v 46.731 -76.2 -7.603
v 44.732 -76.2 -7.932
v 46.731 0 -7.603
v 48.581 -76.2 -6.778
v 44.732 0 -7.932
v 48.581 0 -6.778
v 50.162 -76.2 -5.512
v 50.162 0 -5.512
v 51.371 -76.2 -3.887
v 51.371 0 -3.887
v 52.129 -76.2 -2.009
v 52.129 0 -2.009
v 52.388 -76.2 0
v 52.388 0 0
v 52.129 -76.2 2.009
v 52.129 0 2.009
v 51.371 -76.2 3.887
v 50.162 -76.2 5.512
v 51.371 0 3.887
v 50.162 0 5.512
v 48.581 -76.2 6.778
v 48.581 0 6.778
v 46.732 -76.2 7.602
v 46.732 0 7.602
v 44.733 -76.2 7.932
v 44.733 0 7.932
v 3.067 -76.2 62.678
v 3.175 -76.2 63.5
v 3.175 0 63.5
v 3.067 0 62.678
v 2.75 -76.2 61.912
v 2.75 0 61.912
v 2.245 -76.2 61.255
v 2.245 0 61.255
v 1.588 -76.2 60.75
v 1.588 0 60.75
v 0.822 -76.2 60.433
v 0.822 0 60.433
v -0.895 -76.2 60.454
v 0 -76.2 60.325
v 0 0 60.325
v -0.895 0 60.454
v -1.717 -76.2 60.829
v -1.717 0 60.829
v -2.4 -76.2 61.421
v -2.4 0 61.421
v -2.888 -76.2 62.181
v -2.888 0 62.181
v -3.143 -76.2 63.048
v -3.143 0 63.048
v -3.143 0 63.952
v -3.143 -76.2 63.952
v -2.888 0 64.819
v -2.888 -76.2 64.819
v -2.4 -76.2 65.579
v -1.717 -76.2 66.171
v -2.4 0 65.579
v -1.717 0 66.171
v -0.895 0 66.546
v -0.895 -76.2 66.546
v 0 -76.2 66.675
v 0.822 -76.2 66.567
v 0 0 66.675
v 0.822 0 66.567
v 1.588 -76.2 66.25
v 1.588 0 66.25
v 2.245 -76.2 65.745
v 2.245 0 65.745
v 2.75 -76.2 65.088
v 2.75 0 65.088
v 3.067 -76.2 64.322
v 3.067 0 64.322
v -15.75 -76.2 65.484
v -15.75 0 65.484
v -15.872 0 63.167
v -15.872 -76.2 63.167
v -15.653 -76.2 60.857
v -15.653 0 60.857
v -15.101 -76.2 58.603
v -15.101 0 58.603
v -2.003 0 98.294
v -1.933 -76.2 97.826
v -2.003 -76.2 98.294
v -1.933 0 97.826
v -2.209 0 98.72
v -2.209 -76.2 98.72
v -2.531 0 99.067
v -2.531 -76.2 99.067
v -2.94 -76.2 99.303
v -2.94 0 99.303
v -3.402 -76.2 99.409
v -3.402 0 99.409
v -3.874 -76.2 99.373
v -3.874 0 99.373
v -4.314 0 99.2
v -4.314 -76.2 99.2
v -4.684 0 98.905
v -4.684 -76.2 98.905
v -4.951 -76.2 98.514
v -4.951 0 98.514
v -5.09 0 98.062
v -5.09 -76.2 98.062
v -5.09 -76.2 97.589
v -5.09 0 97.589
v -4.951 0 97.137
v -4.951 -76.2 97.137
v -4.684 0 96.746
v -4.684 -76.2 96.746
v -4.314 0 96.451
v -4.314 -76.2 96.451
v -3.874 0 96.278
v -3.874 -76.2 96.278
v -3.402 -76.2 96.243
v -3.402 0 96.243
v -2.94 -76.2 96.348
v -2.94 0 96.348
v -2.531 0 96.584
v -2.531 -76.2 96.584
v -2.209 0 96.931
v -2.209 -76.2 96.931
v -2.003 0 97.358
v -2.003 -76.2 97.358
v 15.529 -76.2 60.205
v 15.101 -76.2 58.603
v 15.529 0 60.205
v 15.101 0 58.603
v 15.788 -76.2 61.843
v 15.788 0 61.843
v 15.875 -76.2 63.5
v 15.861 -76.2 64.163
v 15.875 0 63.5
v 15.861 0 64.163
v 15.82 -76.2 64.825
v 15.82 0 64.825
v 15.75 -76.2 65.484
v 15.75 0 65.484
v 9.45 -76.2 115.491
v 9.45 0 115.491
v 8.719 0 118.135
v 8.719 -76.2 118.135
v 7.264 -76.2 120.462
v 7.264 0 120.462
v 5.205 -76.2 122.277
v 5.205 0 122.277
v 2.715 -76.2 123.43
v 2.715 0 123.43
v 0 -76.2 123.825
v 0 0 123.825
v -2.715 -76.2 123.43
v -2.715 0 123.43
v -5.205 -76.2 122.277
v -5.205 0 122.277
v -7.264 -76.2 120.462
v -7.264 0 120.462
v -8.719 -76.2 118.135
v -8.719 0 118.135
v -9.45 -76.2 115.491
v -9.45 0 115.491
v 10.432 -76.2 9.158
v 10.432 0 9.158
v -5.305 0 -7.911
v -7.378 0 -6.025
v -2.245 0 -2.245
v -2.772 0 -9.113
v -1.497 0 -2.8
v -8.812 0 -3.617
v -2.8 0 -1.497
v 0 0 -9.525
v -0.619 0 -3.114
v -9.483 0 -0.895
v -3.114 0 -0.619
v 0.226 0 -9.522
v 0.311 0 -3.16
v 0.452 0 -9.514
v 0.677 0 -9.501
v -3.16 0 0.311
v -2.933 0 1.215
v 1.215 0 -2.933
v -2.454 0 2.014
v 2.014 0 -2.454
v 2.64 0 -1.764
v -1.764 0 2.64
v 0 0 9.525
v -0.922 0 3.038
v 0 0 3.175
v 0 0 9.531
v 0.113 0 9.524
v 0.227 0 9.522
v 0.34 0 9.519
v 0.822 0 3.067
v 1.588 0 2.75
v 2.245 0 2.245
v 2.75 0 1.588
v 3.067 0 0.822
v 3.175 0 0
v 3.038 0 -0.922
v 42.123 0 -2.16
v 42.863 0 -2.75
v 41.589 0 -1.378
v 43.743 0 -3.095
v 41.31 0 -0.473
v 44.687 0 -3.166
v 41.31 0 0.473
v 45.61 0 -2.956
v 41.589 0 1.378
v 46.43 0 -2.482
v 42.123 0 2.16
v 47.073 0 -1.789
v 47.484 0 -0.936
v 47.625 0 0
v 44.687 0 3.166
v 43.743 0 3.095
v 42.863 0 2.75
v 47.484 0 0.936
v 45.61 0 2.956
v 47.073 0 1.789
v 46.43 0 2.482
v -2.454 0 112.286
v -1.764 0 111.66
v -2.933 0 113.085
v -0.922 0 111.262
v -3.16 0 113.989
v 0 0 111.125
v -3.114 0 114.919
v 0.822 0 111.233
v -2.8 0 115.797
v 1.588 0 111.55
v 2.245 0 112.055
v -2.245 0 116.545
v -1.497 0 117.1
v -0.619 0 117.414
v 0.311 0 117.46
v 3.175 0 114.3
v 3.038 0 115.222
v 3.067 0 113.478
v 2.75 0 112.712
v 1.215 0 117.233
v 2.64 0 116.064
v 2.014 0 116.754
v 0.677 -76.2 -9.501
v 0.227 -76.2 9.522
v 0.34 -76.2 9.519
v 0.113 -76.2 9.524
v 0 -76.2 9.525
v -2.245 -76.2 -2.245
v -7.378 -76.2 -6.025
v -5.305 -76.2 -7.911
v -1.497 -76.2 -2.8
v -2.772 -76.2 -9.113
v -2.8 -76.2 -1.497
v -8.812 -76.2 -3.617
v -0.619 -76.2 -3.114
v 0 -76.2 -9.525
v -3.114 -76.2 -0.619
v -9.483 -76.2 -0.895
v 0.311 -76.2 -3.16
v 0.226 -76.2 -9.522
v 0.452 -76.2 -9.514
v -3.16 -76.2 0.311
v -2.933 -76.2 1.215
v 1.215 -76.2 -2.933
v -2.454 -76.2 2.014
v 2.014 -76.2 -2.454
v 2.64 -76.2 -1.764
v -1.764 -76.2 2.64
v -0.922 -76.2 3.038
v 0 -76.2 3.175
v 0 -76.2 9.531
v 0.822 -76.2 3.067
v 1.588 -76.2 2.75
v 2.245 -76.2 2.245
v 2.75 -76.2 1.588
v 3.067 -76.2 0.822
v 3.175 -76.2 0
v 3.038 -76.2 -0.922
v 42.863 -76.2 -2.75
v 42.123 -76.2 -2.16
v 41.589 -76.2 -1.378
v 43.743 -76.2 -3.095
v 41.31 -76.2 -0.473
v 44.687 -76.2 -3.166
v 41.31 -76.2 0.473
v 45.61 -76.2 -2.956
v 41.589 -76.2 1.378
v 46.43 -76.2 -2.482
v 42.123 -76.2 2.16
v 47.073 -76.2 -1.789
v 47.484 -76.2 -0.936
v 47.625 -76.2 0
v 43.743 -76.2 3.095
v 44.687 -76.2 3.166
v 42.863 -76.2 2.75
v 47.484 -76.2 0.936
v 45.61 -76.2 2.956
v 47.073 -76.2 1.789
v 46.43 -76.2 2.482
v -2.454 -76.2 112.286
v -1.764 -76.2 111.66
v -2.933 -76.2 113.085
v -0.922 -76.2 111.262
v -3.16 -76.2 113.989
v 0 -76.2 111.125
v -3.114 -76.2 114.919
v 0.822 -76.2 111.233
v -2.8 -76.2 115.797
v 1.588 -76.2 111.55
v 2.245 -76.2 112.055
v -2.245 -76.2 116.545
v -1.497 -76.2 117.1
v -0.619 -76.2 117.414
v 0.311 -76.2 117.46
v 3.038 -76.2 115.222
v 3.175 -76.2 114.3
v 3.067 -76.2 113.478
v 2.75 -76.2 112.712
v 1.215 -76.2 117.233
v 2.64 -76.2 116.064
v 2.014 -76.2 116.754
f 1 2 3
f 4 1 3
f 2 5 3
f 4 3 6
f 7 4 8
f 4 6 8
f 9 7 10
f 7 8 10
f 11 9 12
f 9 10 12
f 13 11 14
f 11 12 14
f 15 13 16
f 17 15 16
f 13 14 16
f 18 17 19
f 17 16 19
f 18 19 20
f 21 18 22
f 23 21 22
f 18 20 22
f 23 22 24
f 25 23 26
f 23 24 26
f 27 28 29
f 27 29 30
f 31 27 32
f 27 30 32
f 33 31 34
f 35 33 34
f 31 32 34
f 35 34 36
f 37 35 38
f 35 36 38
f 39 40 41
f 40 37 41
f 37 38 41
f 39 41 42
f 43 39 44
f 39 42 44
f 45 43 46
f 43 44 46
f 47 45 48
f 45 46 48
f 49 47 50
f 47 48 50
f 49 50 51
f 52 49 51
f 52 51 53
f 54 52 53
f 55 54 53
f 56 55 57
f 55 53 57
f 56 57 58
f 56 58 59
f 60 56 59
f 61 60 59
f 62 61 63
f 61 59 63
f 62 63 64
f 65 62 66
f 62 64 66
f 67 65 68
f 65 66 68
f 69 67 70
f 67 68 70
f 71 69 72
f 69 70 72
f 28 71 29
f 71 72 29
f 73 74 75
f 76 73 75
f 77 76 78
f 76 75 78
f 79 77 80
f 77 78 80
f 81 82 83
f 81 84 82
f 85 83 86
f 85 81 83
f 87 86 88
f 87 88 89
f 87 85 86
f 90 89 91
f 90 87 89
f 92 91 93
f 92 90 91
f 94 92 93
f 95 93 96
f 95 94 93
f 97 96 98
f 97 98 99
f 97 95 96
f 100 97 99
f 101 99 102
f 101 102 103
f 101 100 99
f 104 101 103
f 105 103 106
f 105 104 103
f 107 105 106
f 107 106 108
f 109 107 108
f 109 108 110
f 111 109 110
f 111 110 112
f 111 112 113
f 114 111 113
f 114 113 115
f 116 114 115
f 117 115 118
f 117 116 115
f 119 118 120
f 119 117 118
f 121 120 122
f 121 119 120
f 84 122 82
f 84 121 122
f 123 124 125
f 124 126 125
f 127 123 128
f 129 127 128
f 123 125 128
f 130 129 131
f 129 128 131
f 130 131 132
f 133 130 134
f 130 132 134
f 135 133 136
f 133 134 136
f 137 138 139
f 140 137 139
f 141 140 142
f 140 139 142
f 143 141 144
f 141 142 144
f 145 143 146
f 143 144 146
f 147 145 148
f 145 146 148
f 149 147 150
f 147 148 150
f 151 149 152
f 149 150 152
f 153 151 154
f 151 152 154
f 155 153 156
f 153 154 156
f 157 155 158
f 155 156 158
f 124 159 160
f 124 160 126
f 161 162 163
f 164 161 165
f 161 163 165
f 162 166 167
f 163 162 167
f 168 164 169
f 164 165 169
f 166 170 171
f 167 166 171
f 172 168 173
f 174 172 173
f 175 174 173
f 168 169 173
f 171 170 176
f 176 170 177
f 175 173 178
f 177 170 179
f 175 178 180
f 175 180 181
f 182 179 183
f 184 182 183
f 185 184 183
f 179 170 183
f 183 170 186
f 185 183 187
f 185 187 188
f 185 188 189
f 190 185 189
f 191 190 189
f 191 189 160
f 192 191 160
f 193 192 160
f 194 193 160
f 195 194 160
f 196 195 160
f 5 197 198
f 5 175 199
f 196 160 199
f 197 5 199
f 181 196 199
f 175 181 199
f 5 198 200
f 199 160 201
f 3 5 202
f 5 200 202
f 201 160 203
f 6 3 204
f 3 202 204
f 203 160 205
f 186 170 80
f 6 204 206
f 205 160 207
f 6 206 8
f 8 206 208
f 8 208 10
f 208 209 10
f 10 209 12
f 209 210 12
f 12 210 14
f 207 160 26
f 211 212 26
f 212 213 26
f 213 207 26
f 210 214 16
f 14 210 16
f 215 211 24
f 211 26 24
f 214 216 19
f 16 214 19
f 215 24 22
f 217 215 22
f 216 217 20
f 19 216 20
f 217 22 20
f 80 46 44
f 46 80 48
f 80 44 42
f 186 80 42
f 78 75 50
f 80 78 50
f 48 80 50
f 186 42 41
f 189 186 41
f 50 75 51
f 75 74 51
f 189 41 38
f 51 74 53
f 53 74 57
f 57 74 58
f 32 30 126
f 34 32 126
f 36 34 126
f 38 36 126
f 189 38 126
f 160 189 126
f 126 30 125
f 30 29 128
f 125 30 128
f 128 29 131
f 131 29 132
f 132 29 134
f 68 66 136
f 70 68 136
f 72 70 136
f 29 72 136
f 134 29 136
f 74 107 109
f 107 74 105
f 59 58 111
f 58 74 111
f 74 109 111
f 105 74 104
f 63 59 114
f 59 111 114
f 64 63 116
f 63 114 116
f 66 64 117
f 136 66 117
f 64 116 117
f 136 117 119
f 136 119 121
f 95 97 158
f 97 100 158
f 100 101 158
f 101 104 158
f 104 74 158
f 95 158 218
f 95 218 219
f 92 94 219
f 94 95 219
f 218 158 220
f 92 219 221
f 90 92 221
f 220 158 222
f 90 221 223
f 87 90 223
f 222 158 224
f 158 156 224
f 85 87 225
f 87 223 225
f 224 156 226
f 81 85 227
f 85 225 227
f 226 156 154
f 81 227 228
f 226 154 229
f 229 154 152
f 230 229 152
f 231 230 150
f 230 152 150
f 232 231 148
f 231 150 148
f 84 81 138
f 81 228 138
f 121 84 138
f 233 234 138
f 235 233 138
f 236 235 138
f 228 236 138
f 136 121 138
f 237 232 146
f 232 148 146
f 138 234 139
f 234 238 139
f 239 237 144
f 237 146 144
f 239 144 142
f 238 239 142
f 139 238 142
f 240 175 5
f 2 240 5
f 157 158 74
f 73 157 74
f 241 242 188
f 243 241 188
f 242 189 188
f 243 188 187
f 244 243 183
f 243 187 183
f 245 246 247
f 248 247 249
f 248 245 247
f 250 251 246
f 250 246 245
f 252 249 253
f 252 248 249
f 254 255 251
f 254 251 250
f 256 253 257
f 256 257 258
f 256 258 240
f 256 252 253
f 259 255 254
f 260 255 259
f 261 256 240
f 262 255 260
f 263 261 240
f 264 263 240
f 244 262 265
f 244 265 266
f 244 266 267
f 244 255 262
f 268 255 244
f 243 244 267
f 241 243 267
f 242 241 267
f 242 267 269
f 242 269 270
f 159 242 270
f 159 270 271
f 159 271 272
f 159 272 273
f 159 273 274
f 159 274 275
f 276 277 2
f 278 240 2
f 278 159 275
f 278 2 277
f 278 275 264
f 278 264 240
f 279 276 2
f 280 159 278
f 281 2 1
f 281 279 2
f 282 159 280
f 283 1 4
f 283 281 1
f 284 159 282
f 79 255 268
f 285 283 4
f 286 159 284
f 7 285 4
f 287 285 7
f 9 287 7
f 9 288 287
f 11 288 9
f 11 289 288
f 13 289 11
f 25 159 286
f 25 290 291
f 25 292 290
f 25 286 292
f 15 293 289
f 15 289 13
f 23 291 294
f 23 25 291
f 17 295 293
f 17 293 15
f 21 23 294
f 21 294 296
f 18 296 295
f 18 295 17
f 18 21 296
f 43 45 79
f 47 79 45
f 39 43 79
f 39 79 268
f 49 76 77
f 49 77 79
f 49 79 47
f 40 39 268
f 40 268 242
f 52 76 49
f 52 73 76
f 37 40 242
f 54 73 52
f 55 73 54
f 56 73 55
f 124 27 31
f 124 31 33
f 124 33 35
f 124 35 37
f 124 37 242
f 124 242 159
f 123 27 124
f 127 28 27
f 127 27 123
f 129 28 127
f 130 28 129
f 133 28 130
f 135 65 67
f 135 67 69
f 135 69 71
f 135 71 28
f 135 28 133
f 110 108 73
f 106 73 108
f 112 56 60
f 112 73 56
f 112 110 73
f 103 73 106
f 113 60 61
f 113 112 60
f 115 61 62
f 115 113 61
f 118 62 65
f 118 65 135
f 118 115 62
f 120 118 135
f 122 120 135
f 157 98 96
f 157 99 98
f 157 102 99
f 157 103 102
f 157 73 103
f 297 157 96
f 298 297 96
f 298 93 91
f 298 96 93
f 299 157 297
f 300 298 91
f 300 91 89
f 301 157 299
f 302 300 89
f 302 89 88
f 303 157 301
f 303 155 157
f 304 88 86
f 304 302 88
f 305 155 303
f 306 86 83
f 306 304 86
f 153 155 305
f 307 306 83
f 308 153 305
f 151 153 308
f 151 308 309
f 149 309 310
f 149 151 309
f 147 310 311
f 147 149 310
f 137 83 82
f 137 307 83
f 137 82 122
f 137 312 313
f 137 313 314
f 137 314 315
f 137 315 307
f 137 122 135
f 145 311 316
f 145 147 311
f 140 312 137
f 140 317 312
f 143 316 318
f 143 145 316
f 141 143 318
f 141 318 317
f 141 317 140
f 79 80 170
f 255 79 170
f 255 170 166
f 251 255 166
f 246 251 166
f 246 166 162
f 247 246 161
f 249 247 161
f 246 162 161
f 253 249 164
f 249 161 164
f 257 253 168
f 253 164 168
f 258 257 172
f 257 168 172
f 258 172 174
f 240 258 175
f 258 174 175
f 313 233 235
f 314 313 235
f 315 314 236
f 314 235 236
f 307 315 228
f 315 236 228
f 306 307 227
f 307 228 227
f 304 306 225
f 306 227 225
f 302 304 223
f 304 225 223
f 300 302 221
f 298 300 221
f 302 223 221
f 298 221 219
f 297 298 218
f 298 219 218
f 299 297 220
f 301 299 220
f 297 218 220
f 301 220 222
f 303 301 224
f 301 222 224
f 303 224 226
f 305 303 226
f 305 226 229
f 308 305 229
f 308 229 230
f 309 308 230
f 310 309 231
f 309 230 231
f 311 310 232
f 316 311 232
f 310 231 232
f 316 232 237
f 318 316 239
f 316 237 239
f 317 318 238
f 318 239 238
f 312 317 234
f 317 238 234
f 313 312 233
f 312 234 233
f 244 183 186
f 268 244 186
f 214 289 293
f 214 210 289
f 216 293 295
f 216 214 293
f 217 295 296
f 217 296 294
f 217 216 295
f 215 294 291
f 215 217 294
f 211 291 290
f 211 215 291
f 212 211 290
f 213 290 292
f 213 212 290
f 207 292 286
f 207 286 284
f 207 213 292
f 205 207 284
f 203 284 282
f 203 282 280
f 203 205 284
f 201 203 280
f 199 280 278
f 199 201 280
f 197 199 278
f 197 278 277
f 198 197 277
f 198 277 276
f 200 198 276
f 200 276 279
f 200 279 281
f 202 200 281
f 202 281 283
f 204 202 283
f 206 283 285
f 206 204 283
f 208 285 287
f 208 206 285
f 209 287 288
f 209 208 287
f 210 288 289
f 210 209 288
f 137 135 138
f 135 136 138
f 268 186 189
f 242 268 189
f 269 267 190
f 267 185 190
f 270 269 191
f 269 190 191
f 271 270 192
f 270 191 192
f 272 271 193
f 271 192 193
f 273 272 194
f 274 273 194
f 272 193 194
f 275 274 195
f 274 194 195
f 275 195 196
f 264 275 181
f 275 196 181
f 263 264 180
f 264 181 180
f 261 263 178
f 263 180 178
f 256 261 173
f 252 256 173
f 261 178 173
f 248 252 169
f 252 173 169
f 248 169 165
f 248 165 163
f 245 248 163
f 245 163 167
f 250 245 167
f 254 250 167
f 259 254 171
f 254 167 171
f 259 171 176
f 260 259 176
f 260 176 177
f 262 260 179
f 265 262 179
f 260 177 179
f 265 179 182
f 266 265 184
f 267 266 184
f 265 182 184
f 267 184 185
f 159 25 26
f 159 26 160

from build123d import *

# Parameters (mm, degrees)
F0_R     = 3.175
F0_R_2   = 1.5875
F1_DEPTH = 25.4
F2_DEPTH = 25.4
F3_DEPTH = 25.4


with BuildPart() as f1:
    # F0 (on Front) → F1 (new body)
    with BuildSketch(Plane.XZ):
        with BuildLine():
            ThreePointArc((0.34017864, 9.5189234419), (0.170116454, 9.5234807393), (0, 9.525))
            ThreePointArc((0, 9.525), (-7.044647886, 6.4108159514), (-9.4828222655, -0.8953808583))
            ThreePointArc((-9.4828222655, -0.8953808583), (-6.4108159514, -7.044647886), (0, -9.525))
            Line((0, -9.525), (0.6773435479, -9.500885786))
            ThreePointArc((0.6773435479, -9.500885786), (6.9705567315, -6.4912990883), (9.525, 0))
            ThreePointArc((9.525, 0), (6.8544083095, 6.6138273131), (0.34017864, 9.5189234419))
        make_face()
        with BuildLine():
            ThreePointArc((3.175, 0), (-2.2450640303, -2.2450640303), (0, 3.175))
            ThreePointArc((0, 3.175), (2.2450640303, 2.2450640303), (3.175, 0))
        make_face(mode=Mode.SUBTRACT)
        with BuildLine():
            ThreePointArc((-9.4828222655, -0.8953808583), (-7.044647886, 6.4108159514), (0, 9.525))
            Line((0, 9.525), (0, 9.5310804347))
            Line((0, 9.5310804347), (0, 47.625))
            ThreePointArc((0, 47.625), (-9.3346028611, 50.6594075516), (-15.1007031189, 58.6026139305))
            Line((-15.1007031189, 58.6026139305), (-9.4828222655, -0.8953808583))
        make_face()
        with BuildLine():
            Line((0, 47.625), (0, 9.5310804347))
            Line((0, 9.5310804347), (0.34017864, 9.5189234419))
            Line((0.34017864, 9.5189234419), (10.4321012974, 9.1582675492))
            Line((10.4321012974, 9.1582675492), (15.1007031189, 58.6026139305))
            ThreePointArc((15.1007031189, 58.6026139305), (9.3346028611, 50.6594075516), (0, 47.625))
        make_face()
        with BuildLine():
            Line((10.4321012974, 9.1582675492), (0.34017864, 9.5189234419))
            ThreePointArc((0.34017864, 9.5189234419), (6.8544083095, 6.6138273131), (9.525, 0))
            ThreePointArc((9.525, 0), (6.9705567315, -6.4912990883), (0.6773435479, -9.500885786))
            Line((0.6773435479, -9.500885786), (44.7324052746, -7.9324746146))
            ThreePointArc((44.7324052746, -7.9324746146), (36.5125000183, 0.0005387766), (44.7334821429, 7.9324362036))
            Line((44.7334821429, 7.9324362036), (10.4321012974, 9.1582675492))
        make_face()
        with BuildLine():
            ThreePointArc((-15.1007031189, 58.6026139305), (-9.3346028611, 50.6594075516), (0, 47.625))
            Line((0, 47.625), (0, 60.325))
            ThreePointArc((0, 60.325), (-3.175, 63.5), (0, 66.675))
            Line((0, 66.675), (0, 79.375))
            ThreePointArc((0, 79.375), (-10.5003255158, 75.40625), (-15.7504882737, 65.484375))
            Line((-15.7504882737, 65.484375), (-15.1007031189, 58.6026139305))
        make_face()
        with BuildLine():
            Line((0, 60.325), (0, 47.625))
            ThreePointArc((0, 47.625), (9.3346028611, 50.6594075516), (15.1007031189, 58.6026139305))
            Line((15.1007031189, 58.6026139305), (15.7504882737, 65.484375))
            ThreePointArc((15.7504882737, 65.484375), (10.5003255158, 75.40625), (0, 79.375))
            Line((0, 79.375), (0, 66.675))
            ThreePointArc((0, 66.675), (2.2450640303, 65.7450640303), (3.175, 63.5))
            ThreePointArc((3.175, 63.5), (2.2450640303, 61.2549359697), (0, 60.325))
        make_face()
        with BuildLine():
            Line((0.6773435479, -9.500885786), (0, -9.525))
            ThreePointArc((0, -9.525), (0.3388863295, -9.5189695375), (0.6773435479, -9.500885786))
        make_face()
        with BuildLine():
            ThreePointArc((-15.7504882737, 65.484375), (-15.8047037758, 62.0076985695), (-15.1007031189, 58.6026139305))
            Line((-15.1007031189, 58.6026139305), (-15.7504882737, 65.484375))
        make_face()
        with BuildLine():
            Line((15.7504882737, 65.484375), (15.1007031189, 58.6026139305))
            ThreePointArc((15.1007031189, 58.6026139305), (15.6802309775, 61.020890988), (15.875, 63.5))
            ThreePointArc((15.875, 63.5), (15.8438414904, 64.4941387366), (15.7504882737, 65.484375))
        make_face()
        with BuildLine():
            ThreePointArc((52.3875, 0), (50.1620069047, 5.5115227815), (44.7334821429, 7.9324362036))
            ThreePointArc((44.7334821429, 7.9324362036), (36.5125000183, 0.0005387766), (44.7324052746, -7.9324746146))
            ThreePointArc((44.7324052746, -7.9324746146), (50.1616327839, -5.5119104847), (52.3875, 0))
        make_face()
        with Locations((44.45, 0)):
            Circle(F0_R, mode=Mode.SUBTRACT)
        with BuildLine():
            Line((-9.4502929642, 115.490625), (-15.7504882737, 65.484375))
            ThreePointArc((-15.7504882737, 65.484375), (-10.5003255158, 75.40625), (0, 79.375))
            Line((0, 79.375), (0, 104.775))
            ThreePointArc((0, 104.775), (-7.14375, 107.9998046905), (-9.4502929642, 115.490625))
        make_face()
        with Locations((-3.5204379819, 97.8255793452)):
            Circle(F0_R_2, mode=Mode.SUBTRACT)
        with BuildLine():
            ThreePointArc((0, 79.375), (10.5003255158, 75.40625), (15.7504882737, 65.484375))
            Line((15.7504882737, 65.484375), (9.4502929642, 115.490625))
            ThreePointArc((9.4502929642, 115.490625), (9.5063048942, 114.896483242), (9.525, 114.3))
            ThreePointArc((9.525, 114.3), (6.7351920908, 107.5648079092), (0, 104.775))
            Line((0, 104.775), (0, 79.375))
        make_face()
        with BuildLine():
            ThreePointArc((9.4502929642, 115.490625), (0, 123.825), (-9.4502929642, 115.490625))
            ThreePointArc((-9.4502929642, 115.490625), (-7.14375, 107.9998046905), (0, 104.775))
            ThreePointArc((0, 104.775), (6.7351920908, 107.5648079092), (9.525, 114.3))
            ThreePointArc((9.525, 114.3), (9.5063048942, 114.896483242), (9.4502929642, 115.490625))
        make_face()
        with BuildLine():
            ThreePointArc((3.175, 114.3), (2.2450640303, 112.0549359697), (0, 111.125))
            ThreePointArc((0, 111.125), (-2.2450640303, 116.5450640303), (3.175, 114.3))
        make_face(mode=Mode.SUBTRACT)
    extrude(amount=F1_DEPTH)

    # F2 (add): a face of the model
    f2_faces = [f1.faces().sort_by_distance(p)[0] for p in [
        (5.1424381461, -25.4, 47.1936001946),
    ]]
    extrude(f2_faces, amount=F2_DEPTH)

    # F3 (add): a face of the model
    f3_faces = [f1.faces().sort_by_distance(p)[0] for p in [
        (5.1424381461, -50.8, 47.1936001946),
    ]]
    extrude(f3_faces, amount=F3_DEPTH)


solid = f1.part
